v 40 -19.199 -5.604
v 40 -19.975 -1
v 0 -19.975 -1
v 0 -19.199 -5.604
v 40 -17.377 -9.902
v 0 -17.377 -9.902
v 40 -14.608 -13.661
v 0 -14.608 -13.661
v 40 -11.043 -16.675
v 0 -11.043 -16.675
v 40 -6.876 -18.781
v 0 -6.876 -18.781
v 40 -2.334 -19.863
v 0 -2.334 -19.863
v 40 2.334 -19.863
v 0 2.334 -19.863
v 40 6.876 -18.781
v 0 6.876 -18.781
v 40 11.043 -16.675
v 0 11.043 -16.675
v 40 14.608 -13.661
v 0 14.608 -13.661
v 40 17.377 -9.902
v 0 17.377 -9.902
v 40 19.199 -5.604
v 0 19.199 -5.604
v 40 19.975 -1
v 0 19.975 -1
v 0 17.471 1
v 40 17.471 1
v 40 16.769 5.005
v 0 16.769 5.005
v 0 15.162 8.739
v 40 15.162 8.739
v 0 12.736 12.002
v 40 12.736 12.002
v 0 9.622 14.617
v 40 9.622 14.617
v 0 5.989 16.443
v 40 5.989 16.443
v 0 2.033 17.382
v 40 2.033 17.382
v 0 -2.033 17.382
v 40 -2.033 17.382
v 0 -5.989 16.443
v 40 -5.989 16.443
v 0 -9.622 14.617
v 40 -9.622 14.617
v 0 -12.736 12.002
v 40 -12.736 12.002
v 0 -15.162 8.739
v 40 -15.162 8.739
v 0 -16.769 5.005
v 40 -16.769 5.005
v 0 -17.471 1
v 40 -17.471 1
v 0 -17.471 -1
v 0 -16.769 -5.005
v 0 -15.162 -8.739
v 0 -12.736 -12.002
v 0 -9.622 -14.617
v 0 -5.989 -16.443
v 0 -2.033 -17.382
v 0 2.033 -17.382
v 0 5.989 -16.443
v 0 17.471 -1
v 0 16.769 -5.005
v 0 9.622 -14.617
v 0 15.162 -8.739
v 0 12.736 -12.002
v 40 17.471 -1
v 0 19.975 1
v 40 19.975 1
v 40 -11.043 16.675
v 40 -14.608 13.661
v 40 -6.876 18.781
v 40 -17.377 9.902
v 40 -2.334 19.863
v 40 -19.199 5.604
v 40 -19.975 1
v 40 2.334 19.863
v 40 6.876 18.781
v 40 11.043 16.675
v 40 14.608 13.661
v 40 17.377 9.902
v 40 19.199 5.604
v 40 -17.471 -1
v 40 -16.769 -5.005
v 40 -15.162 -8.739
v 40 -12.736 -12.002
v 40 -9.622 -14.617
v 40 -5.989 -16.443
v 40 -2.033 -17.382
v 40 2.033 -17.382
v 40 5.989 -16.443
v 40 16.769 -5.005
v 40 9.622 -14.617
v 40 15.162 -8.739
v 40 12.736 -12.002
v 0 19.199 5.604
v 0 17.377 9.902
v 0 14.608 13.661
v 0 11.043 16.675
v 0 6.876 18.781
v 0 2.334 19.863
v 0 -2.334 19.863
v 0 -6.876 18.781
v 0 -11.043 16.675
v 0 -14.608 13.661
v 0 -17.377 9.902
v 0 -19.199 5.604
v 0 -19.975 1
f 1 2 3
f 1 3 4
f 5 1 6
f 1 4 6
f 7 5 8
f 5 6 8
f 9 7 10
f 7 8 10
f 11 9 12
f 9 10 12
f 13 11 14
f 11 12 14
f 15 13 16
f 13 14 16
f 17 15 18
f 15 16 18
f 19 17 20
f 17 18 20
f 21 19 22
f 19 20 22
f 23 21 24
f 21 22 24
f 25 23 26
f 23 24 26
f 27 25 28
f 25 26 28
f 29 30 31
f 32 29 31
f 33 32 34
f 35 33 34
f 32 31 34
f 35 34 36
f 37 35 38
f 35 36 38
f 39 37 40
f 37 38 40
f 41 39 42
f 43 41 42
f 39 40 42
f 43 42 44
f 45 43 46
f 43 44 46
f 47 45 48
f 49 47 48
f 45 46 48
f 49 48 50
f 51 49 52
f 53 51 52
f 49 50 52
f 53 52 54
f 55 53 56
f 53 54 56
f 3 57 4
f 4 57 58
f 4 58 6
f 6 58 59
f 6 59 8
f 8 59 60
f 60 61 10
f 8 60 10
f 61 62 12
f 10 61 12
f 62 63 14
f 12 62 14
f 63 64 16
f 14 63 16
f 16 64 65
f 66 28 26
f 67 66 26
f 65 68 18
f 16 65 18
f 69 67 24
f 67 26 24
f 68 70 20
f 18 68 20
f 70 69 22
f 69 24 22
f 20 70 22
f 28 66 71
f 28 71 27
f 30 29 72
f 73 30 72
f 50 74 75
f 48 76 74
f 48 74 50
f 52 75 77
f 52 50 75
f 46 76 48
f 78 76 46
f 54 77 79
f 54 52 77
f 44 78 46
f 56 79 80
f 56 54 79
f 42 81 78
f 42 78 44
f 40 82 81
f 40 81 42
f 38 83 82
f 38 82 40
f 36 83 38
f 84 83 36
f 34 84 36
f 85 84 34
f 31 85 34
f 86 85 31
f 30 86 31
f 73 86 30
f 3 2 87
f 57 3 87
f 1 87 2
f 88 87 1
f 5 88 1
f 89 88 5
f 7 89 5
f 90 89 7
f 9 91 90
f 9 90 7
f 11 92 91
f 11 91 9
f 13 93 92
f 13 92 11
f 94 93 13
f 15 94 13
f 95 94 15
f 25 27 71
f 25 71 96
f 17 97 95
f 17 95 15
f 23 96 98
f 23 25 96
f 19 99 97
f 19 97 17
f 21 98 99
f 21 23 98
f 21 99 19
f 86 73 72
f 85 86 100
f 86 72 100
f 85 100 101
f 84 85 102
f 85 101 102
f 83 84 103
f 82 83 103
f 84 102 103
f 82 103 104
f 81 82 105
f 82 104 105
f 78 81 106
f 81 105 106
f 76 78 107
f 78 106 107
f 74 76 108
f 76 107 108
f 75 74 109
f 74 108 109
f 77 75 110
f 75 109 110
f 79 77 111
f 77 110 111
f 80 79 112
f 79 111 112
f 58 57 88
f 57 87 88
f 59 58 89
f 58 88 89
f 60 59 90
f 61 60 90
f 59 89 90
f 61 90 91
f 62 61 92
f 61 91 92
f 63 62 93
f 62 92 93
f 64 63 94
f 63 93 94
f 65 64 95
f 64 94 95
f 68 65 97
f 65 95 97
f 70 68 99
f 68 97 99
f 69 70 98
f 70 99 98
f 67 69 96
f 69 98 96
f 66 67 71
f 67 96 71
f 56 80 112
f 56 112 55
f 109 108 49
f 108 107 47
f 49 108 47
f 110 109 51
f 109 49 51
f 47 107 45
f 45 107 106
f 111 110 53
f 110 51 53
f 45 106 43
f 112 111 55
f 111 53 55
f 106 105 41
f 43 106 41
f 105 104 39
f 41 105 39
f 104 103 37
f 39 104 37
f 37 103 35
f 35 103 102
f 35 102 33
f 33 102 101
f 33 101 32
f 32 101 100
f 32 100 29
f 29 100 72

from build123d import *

# Parameters (mm, degrees)
SKETCH_1_R          = 20
EXTRUDE_1_DEPTH     = 40
SKETCH_2_R          = 17.5
CUT_EXTRUDE_1_DEPTH = 40
SKETCH_3_W          = 2
SKETCH_3_H          = 43.604257984
CUT_EXTRUDE_2_DEPTH = 40


with BuildPart() as part:
    # 草图1 → 凸台-拉伸1 (new body)
    with BuildSketch(Plane(origin=(0, 0, 0), x_dir=(0, 0, -1), z_dir=(1, 0, 0))):
        Circle(SKETCH_1_R)
    extrude(amount=EXTRUDE_1_DEPTH)

    # 草图2 → 切除-拉伸1 (cut)
    with BuildSketch(Plane(origin=(40, 0, 0), x_dir=(0, 0, -1), z_dir=(1, 0, 0))):
        Circle(SKETCH_2_R)
    extrude(amount=-CUT_EXTRUDE_1_DEPTH, mode=Mode.SUBTRACT)

    # 草图3 → 切除-拉伸2 (cut)
    with BuildSketch(Plane(origin=(40, 0, 0), x_dir=(0, 0, -1), z_dir=(1, 0, 0))):
        with Locations((0, -0.323473724)):
            Rectangle(SKETCH_3_W, SKETCH_3_H)
    extrude(amount=-CUT_EXTRUDE_2_DEPTH, mode=Mode.SUBTRACT)


with BuildPart() as cut_extrude_2_piece_1:
    # of the separate pieces the step leaves, piece 1, a body of its own (cut_extrude_2_pieces)
    add(part.part.solids().sort_by_distance((0, 19.974984355, 1))[0])


with BuildPart() as cut_extrude_2_piece_2:
    # of the separate pieces the step leaves, piece 2, a body of its own (cut_extrude_2_pieces)
    add(part.part.solids().sort_by_distance((0, -19.974984355, -1))[0])


solid = Compound([cut_extrude_2_piece_1.part, cut_extrude_2_piece_2.part])
